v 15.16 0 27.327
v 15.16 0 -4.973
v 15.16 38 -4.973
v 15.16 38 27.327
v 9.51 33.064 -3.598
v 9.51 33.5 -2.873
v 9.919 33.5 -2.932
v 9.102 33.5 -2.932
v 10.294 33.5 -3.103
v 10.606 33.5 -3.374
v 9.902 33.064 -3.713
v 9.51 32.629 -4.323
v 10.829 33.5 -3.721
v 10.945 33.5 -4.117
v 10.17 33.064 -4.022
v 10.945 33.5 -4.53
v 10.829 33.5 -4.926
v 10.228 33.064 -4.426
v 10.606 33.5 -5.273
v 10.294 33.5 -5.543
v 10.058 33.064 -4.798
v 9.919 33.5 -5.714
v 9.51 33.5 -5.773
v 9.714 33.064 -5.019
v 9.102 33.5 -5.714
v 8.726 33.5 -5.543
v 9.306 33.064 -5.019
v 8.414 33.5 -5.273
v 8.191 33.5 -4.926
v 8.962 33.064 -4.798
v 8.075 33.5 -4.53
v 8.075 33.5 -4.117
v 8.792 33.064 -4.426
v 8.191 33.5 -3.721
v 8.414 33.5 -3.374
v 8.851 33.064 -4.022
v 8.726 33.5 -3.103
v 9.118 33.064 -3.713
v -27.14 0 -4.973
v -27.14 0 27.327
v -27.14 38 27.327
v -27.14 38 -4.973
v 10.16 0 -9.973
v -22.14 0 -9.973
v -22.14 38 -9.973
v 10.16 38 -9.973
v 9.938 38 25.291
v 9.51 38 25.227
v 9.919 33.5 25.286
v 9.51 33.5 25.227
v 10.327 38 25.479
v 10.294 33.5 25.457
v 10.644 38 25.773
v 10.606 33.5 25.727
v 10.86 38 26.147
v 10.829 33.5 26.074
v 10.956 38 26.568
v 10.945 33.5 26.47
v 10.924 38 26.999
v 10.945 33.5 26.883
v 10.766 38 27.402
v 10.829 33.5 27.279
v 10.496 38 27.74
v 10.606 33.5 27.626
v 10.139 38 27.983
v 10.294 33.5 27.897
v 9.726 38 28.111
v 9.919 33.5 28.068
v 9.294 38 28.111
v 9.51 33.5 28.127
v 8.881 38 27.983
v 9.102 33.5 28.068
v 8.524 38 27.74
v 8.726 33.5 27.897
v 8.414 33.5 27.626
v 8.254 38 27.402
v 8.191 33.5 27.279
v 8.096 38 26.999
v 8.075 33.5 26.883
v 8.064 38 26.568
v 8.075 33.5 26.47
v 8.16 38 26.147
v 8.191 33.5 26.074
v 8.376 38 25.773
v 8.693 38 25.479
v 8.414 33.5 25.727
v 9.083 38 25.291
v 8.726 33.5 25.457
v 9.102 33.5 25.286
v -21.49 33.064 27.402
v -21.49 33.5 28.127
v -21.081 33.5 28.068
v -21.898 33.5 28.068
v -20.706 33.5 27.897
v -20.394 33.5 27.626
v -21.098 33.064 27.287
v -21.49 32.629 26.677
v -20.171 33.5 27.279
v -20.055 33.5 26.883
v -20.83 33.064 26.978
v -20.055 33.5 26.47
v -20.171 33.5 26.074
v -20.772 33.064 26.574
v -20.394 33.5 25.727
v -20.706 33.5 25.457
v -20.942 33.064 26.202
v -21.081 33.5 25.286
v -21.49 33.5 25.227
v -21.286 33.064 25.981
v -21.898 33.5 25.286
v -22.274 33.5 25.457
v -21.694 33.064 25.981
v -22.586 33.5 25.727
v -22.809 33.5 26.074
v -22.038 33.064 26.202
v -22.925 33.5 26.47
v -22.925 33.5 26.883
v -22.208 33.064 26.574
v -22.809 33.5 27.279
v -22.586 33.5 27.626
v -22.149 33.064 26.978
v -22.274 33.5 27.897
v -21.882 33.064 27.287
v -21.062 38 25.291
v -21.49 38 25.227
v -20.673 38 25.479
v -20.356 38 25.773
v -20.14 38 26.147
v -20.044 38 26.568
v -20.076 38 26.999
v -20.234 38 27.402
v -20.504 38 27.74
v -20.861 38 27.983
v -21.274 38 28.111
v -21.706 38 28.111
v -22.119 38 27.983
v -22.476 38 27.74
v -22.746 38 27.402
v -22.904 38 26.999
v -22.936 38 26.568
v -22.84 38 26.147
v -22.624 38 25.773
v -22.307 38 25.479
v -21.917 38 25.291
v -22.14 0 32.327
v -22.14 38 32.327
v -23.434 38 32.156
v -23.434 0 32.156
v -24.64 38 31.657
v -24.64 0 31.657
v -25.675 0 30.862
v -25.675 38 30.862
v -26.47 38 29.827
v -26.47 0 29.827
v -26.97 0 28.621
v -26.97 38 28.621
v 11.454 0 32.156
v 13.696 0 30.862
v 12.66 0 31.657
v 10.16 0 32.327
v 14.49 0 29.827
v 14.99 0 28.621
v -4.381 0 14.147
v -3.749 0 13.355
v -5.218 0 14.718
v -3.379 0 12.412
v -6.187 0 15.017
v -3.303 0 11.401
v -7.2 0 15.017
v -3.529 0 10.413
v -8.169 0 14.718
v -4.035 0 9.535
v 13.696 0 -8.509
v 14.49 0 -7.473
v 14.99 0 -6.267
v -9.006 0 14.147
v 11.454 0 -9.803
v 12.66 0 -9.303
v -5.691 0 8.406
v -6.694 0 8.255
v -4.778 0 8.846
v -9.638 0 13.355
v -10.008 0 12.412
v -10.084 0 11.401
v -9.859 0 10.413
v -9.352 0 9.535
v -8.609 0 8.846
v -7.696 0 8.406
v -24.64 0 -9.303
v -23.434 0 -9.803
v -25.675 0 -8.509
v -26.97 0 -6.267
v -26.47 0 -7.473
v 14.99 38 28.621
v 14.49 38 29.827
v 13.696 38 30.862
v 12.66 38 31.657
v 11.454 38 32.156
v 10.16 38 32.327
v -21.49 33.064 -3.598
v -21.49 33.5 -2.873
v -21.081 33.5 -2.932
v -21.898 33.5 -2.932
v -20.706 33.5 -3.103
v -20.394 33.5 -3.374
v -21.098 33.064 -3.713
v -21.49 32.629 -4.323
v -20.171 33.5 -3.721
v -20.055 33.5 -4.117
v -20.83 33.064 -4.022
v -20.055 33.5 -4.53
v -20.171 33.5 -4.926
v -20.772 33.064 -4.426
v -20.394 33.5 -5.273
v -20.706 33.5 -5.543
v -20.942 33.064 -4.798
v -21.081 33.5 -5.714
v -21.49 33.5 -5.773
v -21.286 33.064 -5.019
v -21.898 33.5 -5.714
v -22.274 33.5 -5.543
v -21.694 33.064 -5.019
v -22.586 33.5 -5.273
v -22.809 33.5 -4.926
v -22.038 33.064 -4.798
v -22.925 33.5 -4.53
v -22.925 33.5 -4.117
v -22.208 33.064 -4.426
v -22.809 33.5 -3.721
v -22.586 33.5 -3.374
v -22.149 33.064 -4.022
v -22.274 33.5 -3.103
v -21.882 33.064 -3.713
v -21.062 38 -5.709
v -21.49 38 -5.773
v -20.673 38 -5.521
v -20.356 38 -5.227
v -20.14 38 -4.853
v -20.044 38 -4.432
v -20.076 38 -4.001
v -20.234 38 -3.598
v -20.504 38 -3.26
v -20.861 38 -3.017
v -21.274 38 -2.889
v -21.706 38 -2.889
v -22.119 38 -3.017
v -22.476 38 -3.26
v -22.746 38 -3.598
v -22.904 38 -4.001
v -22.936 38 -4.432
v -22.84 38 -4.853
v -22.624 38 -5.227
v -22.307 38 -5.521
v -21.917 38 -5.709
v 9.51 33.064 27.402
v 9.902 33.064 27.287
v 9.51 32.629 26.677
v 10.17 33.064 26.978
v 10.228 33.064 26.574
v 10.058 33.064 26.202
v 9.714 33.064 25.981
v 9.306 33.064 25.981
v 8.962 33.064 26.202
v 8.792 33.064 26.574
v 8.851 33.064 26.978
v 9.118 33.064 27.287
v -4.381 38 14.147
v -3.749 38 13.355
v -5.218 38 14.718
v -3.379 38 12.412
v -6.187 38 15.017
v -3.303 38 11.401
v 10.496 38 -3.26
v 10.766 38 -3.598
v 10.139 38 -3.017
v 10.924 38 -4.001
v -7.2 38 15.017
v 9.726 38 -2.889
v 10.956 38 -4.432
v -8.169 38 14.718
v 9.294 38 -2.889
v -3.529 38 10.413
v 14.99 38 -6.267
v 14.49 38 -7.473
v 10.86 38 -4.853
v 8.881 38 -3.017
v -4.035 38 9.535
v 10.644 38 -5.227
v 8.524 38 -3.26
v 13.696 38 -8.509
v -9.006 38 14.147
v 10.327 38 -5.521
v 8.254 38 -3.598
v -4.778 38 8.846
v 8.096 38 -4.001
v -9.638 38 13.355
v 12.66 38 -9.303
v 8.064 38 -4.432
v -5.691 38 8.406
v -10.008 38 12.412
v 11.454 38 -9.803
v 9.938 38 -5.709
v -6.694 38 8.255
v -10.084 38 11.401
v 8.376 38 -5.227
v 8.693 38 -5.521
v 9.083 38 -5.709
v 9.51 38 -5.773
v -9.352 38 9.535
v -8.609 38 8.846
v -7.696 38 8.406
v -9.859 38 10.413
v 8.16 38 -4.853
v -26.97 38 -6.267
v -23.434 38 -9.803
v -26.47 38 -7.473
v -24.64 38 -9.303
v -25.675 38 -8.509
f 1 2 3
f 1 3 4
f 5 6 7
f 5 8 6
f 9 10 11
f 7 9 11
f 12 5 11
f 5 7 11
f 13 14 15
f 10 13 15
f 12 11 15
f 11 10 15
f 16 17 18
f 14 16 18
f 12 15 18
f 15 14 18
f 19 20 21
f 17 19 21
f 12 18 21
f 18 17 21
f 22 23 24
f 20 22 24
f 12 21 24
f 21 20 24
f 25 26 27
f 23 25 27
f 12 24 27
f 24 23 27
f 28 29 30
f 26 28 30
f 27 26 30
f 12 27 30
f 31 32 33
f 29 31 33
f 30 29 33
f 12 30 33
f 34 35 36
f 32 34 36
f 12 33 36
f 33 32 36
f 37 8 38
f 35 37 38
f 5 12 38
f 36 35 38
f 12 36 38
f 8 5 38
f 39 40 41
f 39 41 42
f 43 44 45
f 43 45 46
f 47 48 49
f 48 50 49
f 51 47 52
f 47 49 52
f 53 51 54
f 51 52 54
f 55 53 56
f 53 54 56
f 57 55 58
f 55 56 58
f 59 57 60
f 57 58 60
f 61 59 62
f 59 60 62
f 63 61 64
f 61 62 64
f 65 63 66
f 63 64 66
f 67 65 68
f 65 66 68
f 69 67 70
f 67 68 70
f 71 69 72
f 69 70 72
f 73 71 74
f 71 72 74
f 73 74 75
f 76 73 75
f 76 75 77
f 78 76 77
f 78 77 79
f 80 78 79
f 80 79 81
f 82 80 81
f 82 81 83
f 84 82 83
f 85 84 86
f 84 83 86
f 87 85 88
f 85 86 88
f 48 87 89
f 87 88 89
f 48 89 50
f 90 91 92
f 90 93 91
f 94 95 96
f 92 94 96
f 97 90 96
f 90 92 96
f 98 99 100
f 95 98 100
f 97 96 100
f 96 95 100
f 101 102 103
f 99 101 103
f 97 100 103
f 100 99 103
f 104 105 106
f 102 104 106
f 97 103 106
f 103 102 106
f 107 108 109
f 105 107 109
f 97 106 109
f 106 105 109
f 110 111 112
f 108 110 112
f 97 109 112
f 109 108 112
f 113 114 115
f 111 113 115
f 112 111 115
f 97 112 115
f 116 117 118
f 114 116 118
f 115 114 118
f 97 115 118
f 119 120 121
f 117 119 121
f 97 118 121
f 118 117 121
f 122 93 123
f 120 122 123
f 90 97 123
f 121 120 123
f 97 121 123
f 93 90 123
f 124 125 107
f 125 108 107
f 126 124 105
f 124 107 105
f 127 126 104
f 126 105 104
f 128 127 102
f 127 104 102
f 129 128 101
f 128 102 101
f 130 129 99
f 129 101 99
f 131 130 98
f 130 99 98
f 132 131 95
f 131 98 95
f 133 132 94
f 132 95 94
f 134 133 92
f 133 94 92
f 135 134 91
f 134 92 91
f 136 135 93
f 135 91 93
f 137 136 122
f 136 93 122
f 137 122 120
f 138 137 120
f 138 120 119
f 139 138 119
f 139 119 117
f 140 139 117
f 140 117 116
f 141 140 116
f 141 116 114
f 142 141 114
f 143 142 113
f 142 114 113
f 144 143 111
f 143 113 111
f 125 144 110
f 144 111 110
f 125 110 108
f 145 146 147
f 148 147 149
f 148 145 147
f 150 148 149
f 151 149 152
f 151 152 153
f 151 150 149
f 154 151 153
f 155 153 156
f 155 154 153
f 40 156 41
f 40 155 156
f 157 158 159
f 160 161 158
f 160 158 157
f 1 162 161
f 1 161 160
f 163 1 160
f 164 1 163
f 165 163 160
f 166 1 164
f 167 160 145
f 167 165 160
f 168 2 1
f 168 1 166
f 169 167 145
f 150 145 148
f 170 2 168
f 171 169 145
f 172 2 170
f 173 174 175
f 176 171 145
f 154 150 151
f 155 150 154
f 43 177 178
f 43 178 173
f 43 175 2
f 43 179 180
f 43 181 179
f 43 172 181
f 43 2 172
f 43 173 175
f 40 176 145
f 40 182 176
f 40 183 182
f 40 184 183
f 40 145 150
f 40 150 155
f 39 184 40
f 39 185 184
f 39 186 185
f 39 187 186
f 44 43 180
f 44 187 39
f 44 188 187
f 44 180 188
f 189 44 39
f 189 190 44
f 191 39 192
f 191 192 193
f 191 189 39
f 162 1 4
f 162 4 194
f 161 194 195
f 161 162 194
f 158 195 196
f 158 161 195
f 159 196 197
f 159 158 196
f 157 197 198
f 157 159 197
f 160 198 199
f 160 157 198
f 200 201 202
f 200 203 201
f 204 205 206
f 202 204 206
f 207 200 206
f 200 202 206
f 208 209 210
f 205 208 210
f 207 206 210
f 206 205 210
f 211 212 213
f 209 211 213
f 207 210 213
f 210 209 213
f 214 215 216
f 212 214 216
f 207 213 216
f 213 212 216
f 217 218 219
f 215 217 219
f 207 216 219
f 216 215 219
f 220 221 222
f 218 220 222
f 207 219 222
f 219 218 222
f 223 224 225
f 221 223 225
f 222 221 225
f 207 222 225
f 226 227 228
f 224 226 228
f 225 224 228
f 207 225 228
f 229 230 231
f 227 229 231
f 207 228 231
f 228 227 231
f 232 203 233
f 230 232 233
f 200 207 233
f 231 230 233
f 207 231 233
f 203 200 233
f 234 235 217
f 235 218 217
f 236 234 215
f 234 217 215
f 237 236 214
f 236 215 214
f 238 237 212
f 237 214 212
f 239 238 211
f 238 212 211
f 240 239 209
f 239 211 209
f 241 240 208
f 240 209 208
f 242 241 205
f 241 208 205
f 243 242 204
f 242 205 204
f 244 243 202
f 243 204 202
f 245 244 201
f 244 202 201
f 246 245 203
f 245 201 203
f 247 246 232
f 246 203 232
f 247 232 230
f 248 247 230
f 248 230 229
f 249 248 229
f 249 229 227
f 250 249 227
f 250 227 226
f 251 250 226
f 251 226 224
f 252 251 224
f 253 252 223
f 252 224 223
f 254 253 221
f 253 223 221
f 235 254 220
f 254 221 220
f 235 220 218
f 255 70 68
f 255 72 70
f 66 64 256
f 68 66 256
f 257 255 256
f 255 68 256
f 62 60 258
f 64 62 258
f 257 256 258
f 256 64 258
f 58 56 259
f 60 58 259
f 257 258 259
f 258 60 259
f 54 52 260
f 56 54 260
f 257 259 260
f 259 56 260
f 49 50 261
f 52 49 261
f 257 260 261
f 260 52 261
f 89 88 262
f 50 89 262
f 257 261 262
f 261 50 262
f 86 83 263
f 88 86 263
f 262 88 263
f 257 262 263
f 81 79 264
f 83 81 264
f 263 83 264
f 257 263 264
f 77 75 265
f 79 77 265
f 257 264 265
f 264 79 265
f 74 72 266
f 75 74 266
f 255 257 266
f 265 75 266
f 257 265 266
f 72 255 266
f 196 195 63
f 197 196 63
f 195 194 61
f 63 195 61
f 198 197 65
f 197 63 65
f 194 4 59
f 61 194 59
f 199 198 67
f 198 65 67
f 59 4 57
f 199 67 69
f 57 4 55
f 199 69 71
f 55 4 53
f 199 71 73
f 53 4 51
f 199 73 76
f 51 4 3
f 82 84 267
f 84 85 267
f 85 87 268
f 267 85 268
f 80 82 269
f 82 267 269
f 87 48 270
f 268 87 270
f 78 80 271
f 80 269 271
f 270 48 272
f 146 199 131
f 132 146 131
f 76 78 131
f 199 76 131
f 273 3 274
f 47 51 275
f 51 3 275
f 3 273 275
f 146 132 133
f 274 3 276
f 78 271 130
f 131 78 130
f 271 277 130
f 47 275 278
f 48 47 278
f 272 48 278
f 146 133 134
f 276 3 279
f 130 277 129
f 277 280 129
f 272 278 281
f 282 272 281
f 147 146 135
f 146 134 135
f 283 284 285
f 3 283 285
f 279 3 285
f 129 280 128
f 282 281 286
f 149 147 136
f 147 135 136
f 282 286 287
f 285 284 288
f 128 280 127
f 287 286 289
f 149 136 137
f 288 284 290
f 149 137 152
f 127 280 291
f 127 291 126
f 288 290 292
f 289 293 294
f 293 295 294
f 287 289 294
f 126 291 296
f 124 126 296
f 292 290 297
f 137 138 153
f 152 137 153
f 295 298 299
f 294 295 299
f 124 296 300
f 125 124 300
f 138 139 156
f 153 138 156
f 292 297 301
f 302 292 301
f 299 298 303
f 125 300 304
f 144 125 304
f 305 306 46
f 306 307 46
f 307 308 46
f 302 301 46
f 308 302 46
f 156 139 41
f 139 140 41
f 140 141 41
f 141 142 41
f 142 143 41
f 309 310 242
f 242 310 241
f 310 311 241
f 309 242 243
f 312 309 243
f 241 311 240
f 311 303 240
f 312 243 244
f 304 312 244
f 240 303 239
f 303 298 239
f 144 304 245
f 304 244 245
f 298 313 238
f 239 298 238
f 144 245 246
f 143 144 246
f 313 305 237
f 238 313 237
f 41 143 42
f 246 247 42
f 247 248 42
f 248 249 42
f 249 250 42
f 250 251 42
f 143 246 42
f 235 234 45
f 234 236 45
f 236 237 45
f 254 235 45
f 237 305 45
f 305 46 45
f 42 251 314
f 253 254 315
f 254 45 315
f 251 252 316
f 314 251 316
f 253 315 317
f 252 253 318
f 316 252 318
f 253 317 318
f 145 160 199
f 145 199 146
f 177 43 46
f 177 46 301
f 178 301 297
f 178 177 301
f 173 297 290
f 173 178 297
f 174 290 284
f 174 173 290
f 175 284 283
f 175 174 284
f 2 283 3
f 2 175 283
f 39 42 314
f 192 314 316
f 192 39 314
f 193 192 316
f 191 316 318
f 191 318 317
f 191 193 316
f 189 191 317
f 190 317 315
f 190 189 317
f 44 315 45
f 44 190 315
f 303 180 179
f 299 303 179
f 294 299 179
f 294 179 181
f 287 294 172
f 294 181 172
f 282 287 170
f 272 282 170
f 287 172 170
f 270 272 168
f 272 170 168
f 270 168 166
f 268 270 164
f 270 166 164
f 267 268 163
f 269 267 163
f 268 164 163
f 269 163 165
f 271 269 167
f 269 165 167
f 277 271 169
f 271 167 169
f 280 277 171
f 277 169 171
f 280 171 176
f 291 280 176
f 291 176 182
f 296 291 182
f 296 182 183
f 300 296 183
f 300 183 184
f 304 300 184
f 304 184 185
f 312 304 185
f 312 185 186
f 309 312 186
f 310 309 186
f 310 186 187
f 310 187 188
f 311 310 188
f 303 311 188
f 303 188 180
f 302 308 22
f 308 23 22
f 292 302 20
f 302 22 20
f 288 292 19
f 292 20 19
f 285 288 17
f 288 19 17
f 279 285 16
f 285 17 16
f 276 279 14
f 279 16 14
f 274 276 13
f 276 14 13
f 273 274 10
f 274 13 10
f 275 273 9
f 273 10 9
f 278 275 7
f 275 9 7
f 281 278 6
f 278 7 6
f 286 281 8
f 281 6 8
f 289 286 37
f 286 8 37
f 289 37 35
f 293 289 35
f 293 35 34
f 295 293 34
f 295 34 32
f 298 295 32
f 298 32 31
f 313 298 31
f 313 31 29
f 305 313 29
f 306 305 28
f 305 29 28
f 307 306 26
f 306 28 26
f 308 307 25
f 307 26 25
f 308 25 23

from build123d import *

# Parameters (mm, degrees)
BOSS_EXTRUDE1_DEPTH         = 38
M3_5X0_6_TAPPED_HOLE2_D     = 2.9
M3_5X0_6_TAPPED_HOLE2_DEPTH = 4.5
M3_5X0_6_TAPPED_HOLE2_TIP   = 0.871247898
M8_TAPPED_HOLE1_D           = 6.8


with BuildPart() as part:
    # Sketch2 → Boss-Extrude1 (new body)
    with BuildSketch(Plane(origin=(0, 0, 0), x_dir=(1, 0, 0), z_dir=(0, 1, 0))):
        with BuildLine():
            Line((-22.139889534, 9.97315624), (10.160110466, 9.97315624))
            ThreePointArc((10.160110466, 9.97315624), (13.695644372, 8.508690146), (15.160110466, 4.97315624))
            Line((15.160110466, 4.97315624), (15.160110466, -27.32684376))
            ThreePointArc((15.160110466, -27.32684376), (13.695644372, -30.862377666), (10.160110466, -32.32684376))
            Line((10.160110466, -32.32684376), (-22.139889534, -32.32684376))
            ThreePointArc((-22.139889534, -32.32684376), (-25.67542344, -30.862377666), (-27.139889534, -27.32684376))
            Line((-27.139889534, -27.32684376), (-27.139889534, 4.97315624))
            ThreePointArc((-27.139889534, 4.97315624), (-25.67542344, 8.508690146), (-22.139889534, 9.97315624))
        make_face()
    extrude(amount=BOSS_EXTRUDE1_DEPTH)

    # M3.5x0.6 Tapped Hole2
    with Locations(Plane(origin=(-21.489889534, 38, 26.67684376), x_dir=(0, 0, 1), z_dir=(0, 1, 0))):
        with Locations((0, 0), (-31, 0), (-31, 31), (0, 31)):
            Hole(M3_5X0_6_TAPPED_HOLE2_D / 2, depth=M3_5X0_6_TAPPED_HOLE2_DEPTH)
            with Locations((0, 0, -(M3_5X0_6_TAPPED_HOLE2_DEPTH + M3_5X0_6_TAPPED_HOLE2_TIP / 2))):  # 118° drill point
                Cone(0, M3_5X0_6_TAPPED_HOLE2_D / 2, M3_5X0_6_TAPPED_HOLE2_TIP, mode=Mode.SUBTRACT)

    # M8 Tapped Hole1 (through all)
    with Locations(Plane(origin=(-6.693665392, 38, 11.655067781), x_dir=(0, 0, 1), z_dir=(0, 1, 0))):
        with Locations((0, 0)):
            Hole(M8_TAPPED_HOLE1_D / 2)


solid = part.part
